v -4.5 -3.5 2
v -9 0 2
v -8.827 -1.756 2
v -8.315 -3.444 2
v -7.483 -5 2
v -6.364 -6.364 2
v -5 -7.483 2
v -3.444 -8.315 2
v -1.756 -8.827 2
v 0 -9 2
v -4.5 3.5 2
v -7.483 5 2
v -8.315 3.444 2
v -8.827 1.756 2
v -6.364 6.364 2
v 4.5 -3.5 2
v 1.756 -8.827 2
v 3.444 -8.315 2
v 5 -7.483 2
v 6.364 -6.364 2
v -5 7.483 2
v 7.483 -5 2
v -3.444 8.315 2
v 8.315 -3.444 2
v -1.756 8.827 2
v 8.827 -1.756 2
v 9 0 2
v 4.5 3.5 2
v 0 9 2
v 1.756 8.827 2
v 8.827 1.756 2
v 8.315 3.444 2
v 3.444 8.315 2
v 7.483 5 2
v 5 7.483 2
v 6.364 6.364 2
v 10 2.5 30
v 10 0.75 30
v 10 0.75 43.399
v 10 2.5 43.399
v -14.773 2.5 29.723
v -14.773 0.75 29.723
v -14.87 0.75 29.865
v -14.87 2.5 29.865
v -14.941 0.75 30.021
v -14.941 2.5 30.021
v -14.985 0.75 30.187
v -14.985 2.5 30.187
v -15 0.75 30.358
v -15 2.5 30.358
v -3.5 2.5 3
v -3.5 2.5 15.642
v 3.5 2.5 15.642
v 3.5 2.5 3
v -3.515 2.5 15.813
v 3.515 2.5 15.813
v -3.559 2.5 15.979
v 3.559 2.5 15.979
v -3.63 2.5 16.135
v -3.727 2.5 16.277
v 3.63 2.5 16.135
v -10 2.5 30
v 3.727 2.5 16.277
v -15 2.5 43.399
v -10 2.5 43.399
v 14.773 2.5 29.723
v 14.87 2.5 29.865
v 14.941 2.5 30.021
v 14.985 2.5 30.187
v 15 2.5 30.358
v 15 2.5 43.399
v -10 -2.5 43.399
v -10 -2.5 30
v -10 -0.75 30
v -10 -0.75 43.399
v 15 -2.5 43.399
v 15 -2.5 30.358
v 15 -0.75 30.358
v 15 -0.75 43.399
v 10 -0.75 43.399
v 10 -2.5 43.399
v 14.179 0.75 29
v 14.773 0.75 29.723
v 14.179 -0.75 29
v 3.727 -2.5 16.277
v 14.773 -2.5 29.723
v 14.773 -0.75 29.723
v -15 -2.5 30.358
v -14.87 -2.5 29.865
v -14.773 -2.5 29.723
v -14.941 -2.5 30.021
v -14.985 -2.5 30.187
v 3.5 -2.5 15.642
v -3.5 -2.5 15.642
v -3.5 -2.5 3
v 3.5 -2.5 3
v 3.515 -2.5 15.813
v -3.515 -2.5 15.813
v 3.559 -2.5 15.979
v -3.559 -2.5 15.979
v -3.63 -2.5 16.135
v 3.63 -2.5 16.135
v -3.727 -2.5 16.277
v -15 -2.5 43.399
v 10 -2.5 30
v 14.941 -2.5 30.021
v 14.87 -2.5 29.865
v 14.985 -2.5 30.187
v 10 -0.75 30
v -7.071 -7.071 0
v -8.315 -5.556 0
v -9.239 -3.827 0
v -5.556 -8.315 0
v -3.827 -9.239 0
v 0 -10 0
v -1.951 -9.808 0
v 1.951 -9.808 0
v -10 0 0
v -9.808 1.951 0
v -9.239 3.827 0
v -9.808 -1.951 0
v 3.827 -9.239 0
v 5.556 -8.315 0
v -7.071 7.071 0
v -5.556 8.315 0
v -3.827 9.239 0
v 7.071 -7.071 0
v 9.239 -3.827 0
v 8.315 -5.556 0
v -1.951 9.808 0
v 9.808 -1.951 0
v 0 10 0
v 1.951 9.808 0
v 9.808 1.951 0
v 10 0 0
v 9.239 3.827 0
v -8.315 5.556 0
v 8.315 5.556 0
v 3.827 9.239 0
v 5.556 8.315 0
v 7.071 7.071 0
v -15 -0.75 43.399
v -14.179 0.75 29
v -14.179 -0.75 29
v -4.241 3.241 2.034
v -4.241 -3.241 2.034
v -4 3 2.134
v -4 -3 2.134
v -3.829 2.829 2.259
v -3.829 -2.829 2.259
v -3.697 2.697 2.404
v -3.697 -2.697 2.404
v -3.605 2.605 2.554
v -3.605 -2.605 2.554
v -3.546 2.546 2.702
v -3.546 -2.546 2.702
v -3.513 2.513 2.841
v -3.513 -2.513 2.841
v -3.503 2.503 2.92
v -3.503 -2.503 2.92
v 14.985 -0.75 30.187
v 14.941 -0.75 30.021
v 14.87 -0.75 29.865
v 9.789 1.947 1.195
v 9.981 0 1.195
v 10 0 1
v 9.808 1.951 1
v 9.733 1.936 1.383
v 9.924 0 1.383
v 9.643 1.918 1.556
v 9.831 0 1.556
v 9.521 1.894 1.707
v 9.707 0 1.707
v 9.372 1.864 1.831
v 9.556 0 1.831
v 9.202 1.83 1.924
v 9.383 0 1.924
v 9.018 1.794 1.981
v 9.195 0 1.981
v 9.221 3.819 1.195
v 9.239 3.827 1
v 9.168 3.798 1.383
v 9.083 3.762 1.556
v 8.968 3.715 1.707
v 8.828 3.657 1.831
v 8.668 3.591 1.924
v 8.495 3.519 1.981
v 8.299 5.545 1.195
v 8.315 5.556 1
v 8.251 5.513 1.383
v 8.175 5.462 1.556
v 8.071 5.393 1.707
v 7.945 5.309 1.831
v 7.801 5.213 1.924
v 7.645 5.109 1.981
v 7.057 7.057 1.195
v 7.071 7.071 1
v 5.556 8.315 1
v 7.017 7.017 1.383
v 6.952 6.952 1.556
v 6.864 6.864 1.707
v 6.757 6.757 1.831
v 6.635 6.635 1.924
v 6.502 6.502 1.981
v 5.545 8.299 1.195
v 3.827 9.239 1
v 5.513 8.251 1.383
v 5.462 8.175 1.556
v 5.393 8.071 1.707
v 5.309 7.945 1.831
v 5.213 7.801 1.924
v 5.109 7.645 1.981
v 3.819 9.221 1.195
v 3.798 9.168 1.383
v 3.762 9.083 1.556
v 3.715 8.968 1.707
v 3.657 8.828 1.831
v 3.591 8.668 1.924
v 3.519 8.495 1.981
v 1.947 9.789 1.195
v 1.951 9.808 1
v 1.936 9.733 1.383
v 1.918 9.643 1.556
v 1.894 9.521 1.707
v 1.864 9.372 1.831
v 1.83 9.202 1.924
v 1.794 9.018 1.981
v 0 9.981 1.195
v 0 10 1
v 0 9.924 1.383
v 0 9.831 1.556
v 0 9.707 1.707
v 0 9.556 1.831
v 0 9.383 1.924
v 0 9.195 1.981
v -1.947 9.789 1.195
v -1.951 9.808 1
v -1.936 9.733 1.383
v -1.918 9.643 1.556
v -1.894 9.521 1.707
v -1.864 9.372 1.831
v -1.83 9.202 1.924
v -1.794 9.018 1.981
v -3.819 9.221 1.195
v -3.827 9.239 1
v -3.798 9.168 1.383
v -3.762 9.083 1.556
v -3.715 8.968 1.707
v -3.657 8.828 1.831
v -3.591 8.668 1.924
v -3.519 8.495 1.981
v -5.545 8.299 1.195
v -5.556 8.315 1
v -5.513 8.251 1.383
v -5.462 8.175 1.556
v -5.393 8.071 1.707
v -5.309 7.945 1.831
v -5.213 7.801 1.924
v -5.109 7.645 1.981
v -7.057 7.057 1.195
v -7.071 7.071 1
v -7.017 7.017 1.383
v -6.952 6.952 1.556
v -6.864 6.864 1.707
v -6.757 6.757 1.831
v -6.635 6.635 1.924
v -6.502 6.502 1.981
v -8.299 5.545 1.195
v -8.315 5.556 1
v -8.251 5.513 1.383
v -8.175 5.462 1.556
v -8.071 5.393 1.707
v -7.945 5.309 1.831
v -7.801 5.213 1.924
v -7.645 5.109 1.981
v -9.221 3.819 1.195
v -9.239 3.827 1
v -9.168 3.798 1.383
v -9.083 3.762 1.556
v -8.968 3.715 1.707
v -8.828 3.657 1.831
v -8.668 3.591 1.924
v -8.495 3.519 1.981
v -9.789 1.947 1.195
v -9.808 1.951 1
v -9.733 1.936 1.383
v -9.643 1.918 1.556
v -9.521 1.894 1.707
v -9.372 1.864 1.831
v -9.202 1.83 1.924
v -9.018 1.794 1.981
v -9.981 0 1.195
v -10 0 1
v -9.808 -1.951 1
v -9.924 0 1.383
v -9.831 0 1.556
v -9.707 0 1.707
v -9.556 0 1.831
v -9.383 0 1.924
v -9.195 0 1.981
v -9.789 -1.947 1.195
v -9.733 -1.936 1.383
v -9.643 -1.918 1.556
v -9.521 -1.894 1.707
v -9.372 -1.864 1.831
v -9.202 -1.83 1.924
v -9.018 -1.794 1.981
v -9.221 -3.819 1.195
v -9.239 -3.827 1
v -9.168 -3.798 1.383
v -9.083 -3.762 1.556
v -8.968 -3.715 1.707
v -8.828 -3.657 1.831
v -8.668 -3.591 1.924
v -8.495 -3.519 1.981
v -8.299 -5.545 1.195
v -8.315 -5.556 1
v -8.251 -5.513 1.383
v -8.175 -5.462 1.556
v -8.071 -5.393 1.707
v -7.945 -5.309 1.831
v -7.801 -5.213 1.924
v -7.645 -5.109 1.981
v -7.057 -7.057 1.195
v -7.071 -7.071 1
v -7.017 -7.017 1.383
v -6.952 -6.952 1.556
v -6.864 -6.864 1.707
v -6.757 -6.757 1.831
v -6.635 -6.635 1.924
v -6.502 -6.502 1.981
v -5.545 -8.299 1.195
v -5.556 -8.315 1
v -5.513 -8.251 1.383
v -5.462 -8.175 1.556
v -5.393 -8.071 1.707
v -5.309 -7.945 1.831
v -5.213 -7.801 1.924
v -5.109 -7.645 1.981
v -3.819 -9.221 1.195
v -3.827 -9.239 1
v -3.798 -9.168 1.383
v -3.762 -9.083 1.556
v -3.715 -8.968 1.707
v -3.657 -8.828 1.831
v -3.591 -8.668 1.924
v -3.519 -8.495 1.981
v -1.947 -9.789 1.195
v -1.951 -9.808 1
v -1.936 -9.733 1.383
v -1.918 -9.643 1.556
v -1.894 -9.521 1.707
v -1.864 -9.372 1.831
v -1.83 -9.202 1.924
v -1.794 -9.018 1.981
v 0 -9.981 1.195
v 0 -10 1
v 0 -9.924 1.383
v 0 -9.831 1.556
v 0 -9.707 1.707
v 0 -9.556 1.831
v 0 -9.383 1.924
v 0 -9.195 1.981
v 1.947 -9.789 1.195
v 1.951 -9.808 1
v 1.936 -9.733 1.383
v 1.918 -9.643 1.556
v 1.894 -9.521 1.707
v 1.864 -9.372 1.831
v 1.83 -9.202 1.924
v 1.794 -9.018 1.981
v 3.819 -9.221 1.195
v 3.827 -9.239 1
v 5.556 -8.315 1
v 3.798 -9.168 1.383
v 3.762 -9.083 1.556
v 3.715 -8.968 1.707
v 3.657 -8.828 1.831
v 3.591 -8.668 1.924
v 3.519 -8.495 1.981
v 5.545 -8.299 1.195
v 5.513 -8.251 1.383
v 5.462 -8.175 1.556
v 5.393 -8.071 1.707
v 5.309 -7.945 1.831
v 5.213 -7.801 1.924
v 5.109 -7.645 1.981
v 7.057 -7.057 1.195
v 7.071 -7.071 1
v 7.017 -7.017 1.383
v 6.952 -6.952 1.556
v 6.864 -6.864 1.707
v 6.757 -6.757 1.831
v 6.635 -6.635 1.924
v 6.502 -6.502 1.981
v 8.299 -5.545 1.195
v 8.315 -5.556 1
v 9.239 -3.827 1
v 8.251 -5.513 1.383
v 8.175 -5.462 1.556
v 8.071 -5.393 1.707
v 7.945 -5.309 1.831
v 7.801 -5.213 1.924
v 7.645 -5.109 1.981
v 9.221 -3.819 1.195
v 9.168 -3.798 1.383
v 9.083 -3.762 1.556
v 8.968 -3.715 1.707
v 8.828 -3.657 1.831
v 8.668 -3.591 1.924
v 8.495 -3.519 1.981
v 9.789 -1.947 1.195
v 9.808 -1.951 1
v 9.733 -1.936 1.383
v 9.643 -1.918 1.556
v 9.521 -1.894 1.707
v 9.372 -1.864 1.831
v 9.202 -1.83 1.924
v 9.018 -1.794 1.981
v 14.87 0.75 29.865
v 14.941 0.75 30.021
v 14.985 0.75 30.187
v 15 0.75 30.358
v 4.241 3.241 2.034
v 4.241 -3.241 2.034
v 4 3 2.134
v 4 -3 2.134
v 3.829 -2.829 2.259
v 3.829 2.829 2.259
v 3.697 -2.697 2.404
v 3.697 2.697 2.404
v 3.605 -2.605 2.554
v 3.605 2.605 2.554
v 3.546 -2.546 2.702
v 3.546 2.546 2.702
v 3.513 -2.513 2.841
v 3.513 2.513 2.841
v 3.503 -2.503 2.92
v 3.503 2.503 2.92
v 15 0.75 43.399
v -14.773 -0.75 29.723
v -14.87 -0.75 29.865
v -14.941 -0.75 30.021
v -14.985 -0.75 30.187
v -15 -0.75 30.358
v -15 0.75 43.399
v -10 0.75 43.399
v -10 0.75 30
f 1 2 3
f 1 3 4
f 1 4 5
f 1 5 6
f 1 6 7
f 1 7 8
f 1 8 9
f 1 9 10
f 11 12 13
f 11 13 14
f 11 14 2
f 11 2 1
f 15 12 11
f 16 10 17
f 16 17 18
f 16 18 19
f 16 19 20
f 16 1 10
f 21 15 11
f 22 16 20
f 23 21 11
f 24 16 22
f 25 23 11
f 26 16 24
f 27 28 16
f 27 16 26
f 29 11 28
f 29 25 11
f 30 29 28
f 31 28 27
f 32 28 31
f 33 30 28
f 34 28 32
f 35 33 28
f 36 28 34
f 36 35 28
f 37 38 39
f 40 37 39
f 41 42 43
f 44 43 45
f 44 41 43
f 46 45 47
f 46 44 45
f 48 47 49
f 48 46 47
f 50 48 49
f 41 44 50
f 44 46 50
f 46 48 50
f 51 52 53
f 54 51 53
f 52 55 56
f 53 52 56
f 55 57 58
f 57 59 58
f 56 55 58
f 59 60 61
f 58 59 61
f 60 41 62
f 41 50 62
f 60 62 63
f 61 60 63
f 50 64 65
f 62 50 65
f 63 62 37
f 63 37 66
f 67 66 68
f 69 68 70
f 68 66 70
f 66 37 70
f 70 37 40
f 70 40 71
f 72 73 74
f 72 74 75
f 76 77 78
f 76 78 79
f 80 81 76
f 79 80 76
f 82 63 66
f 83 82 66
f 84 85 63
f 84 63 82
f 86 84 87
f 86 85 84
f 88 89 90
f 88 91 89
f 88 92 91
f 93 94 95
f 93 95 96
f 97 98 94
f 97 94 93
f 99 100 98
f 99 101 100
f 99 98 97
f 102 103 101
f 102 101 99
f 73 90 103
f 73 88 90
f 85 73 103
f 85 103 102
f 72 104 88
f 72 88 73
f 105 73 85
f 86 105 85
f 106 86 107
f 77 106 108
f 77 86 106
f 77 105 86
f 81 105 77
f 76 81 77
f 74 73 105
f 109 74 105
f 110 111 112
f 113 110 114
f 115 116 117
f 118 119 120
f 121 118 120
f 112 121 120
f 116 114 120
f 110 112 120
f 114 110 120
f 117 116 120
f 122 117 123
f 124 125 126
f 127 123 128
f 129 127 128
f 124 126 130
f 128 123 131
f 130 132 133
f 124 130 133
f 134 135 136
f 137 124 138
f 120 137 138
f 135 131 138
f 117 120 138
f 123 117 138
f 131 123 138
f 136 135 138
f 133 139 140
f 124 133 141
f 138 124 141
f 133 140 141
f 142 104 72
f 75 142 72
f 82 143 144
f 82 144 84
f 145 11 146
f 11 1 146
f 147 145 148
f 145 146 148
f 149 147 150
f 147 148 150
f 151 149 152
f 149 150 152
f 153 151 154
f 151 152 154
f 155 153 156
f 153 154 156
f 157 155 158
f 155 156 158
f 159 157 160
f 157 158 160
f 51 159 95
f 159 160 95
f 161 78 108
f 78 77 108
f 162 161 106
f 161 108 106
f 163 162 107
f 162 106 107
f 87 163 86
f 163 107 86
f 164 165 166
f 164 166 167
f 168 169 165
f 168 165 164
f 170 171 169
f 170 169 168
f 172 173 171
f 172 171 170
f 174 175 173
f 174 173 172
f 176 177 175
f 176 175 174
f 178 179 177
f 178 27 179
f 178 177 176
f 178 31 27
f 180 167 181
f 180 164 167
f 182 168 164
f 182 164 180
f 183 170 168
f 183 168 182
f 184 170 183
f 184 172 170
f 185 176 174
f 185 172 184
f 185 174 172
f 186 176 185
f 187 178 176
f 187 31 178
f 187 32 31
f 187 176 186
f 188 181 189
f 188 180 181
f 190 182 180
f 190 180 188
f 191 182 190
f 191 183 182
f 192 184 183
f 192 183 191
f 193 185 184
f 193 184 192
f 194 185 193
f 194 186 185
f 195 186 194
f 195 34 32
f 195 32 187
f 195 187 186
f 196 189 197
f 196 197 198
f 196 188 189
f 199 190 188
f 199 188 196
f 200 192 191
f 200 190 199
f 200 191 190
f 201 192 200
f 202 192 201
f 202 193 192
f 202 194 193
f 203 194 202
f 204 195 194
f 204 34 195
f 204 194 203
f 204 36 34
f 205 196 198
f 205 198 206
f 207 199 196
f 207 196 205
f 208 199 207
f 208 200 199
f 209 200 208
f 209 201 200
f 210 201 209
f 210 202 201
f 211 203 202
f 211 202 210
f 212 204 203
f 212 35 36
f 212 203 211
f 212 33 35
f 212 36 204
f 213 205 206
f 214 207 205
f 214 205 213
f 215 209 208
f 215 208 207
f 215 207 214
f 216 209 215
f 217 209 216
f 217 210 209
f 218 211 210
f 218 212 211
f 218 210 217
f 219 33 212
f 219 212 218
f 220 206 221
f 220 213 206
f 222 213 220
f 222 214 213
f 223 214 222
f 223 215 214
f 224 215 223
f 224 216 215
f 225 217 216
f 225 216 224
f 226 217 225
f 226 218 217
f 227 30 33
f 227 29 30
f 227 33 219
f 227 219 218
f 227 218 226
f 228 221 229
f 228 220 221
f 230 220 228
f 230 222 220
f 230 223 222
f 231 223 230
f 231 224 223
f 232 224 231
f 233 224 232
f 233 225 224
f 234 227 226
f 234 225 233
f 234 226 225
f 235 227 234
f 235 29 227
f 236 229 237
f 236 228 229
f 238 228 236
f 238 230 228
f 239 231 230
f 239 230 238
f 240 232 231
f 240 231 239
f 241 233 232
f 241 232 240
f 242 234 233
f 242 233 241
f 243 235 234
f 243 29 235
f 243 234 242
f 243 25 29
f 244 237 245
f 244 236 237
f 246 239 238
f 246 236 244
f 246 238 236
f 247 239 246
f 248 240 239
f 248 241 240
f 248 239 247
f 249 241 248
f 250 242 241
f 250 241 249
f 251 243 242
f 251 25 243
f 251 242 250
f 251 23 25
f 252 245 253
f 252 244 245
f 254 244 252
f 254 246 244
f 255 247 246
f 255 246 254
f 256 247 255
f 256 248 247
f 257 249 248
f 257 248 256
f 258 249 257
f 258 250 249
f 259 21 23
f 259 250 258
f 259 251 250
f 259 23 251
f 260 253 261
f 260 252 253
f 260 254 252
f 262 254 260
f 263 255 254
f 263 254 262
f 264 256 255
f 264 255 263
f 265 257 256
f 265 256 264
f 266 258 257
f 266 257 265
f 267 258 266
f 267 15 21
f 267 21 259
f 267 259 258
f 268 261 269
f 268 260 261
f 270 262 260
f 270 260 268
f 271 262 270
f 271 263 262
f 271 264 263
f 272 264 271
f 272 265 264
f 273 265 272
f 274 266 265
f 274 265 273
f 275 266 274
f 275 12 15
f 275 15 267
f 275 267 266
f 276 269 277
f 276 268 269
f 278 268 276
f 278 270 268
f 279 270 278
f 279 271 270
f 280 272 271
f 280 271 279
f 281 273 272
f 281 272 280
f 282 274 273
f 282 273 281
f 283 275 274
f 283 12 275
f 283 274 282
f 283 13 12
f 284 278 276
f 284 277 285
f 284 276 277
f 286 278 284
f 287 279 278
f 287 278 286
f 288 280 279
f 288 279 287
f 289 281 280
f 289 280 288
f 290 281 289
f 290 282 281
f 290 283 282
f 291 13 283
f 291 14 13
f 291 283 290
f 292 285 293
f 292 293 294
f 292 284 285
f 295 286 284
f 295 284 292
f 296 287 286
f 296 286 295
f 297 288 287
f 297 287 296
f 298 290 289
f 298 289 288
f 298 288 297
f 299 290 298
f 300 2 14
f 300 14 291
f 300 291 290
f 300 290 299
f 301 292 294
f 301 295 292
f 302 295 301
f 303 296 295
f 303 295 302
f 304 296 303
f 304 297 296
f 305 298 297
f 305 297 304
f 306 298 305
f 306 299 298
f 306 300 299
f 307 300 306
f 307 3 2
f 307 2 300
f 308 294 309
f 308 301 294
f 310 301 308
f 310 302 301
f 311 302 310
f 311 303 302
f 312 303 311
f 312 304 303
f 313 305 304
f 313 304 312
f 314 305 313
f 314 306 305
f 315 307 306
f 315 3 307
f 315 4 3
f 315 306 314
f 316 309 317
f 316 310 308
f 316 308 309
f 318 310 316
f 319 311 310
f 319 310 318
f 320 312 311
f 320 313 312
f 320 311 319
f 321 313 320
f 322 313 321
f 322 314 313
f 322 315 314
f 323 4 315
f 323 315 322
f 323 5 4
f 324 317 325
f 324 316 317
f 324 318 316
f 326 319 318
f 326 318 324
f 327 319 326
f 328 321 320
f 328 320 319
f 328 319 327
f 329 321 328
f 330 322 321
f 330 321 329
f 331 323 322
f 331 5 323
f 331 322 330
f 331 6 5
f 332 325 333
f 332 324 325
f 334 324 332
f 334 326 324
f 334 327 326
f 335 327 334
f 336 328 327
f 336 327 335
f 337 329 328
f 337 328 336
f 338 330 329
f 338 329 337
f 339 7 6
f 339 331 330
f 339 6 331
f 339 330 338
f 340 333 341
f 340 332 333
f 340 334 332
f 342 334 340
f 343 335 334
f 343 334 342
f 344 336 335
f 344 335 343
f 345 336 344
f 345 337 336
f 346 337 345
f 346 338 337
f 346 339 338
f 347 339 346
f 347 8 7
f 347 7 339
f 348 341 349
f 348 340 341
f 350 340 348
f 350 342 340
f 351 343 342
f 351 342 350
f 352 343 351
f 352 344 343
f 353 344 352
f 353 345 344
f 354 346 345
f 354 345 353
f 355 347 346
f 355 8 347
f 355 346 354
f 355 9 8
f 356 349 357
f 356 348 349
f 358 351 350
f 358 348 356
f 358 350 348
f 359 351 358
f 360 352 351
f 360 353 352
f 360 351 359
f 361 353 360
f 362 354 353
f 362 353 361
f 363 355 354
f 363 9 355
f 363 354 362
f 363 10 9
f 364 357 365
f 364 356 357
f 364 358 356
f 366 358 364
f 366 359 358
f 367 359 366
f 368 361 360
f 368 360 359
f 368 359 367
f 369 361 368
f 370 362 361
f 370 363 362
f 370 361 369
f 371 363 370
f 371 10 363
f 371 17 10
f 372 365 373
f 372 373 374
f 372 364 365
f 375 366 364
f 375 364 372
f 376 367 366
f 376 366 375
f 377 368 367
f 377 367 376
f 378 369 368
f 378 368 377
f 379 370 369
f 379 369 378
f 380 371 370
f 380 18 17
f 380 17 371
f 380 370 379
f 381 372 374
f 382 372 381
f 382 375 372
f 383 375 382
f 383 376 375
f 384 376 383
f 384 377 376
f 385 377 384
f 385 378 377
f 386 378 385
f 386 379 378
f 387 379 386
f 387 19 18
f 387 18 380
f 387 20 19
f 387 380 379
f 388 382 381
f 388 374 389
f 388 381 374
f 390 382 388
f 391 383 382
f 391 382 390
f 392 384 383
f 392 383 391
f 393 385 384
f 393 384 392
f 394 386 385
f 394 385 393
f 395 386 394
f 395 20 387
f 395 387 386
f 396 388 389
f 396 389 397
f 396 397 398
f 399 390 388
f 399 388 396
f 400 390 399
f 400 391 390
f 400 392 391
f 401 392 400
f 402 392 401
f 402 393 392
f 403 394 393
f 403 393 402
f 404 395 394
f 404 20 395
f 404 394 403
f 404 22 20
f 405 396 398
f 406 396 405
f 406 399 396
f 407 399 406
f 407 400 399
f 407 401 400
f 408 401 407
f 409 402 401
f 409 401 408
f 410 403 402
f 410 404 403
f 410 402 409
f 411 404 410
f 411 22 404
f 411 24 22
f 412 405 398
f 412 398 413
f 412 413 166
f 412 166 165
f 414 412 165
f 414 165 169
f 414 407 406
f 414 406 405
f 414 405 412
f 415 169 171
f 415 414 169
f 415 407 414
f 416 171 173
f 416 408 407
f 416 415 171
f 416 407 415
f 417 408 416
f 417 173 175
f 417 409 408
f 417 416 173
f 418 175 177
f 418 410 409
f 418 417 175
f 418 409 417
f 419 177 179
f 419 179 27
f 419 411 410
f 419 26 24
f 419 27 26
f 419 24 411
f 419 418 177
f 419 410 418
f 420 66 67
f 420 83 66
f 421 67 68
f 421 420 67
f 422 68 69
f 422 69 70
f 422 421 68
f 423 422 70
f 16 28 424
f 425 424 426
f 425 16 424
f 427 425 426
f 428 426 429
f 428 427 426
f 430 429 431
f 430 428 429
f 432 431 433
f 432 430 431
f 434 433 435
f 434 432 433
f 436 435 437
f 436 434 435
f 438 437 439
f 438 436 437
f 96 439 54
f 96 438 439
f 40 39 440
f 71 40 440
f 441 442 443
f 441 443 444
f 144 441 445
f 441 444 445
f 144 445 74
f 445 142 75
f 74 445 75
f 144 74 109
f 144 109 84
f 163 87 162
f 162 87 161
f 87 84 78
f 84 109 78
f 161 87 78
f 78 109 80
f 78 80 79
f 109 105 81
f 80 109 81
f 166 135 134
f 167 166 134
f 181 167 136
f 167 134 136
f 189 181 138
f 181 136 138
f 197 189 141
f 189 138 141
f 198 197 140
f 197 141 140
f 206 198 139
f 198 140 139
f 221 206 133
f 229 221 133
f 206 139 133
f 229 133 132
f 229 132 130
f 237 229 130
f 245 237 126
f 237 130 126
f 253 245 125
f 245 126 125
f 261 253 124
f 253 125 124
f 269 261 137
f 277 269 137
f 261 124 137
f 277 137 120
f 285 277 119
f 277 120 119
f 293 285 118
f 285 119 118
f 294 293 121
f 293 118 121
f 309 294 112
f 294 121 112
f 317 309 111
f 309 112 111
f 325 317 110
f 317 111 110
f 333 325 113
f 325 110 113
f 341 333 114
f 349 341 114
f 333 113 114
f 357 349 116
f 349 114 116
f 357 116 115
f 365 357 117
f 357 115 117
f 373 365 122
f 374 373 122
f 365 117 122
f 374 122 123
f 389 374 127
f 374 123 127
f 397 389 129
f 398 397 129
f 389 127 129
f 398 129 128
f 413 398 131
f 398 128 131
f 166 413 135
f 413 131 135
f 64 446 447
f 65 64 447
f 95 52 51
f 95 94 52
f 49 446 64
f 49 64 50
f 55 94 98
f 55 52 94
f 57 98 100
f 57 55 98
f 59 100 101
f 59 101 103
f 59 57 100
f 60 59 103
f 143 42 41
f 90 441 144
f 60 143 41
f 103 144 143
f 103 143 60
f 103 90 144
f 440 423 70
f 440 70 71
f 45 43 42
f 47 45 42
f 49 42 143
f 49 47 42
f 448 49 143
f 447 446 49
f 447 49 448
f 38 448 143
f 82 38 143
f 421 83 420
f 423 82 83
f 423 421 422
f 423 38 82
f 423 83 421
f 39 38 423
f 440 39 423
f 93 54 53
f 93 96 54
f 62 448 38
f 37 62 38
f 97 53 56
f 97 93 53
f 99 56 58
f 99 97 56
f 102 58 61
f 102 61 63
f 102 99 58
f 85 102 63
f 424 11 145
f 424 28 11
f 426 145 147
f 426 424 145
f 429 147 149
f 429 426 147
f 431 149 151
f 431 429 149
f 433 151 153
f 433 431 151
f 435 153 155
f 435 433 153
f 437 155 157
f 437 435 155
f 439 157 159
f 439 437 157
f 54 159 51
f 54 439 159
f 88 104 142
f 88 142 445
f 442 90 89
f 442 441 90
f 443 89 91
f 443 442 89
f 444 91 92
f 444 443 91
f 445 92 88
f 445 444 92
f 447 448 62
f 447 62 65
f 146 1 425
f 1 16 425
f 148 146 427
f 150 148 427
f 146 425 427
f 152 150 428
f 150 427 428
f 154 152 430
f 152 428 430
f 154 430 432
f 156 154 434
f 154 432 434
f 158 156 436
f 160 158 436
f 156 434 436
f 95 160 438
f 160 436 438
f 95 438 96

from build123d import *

# Parameters (mm, degrees)
F0_R     = 10
F1_DEPTH = 2
F3_DEPTH = 2.5
F4_W     = 20
F4_H     = 30
F5_DEPTH = 12.501
F6_W     = 30
F6_H     = 1.5
F7_DEPTH = 31
F8_W     = 30
F8_H     = 16.6010832787
F9_DEPTH = 12.501
F10_R    = 1


with BuildPart() as f1:
    # F0 (on Top) → F1 (new body)
    with BuildSketch(Plane.XY):
        Circle(F0_R)
    extrude(amount=F1_DEPTH)

    # F2 (on Front) → F3 (join, symmetric)
    with BuildSketch(Plane.XZ):
        Polygon((3.5, 30), (-3.5, 30), (-3.5, 16), (-3.5, 2), (3.5, 2), (3.5, 16), align=None)
        Polygon((-15, 30), (-3.5, 30), (3.5, 30), (15, 30), (15, 60), (-15, 60), align=None)
        Polygon((-3.5, 16), (-3.5, 30), (-15, 30), align=None)
        Polygon((15, 30), (3.5, 30), (3.5, 16), align=None)
    extrude(amount=F3_DEPTH, both=True)

    # F4 (on face) → F5 (cut, through all)
    with BuildSketch(Plane.XZ.offset(2.5)):
        with Locations((0, 45)):
            Rectangle(F4_W, F4_H)
    extrude(amount=-F5_DEPTH, mode=Mode.SUBTRACT)

    # F6 (on face) → F7 (cut)
    with BuildSketch(Plane.XY.offset(60)):
        Rectangle(F6_W, F6_H)
    extrude(amount=-F7_DEPTH, mode=Mode.SUBTRACT)

    # F8 (on face) → F9 (cut, through all)
    with BuildSketch(Plane.XZ.offset(2.5)):
        with Locations((0, 51.6994583607)):
            Rectangle(F8_W, F8_H)
    extrude(amount=-F9_DEPTH, mode=Mode.SUBTRACT)

    # F10
    f10_edges = [f1.edges().sort_by_distance(p)[0] for p in [
        (-10, 0, 2),
        (-3.5, 0, 2),
        (0, -2.5, 2),
        (3.5, 0, 2),
        (0, 2.5, 2),
        (-3.5, 0, 16),
        (3.5, 0, 16),
        (15, -1.625, 30),
        (15, 1.625, 30),
        (-15, -1.625, 30),
        (-15, 1.625, 30),
    ]]
    fillet(f10_edges, radius=F10_R)


solid = f1.part
